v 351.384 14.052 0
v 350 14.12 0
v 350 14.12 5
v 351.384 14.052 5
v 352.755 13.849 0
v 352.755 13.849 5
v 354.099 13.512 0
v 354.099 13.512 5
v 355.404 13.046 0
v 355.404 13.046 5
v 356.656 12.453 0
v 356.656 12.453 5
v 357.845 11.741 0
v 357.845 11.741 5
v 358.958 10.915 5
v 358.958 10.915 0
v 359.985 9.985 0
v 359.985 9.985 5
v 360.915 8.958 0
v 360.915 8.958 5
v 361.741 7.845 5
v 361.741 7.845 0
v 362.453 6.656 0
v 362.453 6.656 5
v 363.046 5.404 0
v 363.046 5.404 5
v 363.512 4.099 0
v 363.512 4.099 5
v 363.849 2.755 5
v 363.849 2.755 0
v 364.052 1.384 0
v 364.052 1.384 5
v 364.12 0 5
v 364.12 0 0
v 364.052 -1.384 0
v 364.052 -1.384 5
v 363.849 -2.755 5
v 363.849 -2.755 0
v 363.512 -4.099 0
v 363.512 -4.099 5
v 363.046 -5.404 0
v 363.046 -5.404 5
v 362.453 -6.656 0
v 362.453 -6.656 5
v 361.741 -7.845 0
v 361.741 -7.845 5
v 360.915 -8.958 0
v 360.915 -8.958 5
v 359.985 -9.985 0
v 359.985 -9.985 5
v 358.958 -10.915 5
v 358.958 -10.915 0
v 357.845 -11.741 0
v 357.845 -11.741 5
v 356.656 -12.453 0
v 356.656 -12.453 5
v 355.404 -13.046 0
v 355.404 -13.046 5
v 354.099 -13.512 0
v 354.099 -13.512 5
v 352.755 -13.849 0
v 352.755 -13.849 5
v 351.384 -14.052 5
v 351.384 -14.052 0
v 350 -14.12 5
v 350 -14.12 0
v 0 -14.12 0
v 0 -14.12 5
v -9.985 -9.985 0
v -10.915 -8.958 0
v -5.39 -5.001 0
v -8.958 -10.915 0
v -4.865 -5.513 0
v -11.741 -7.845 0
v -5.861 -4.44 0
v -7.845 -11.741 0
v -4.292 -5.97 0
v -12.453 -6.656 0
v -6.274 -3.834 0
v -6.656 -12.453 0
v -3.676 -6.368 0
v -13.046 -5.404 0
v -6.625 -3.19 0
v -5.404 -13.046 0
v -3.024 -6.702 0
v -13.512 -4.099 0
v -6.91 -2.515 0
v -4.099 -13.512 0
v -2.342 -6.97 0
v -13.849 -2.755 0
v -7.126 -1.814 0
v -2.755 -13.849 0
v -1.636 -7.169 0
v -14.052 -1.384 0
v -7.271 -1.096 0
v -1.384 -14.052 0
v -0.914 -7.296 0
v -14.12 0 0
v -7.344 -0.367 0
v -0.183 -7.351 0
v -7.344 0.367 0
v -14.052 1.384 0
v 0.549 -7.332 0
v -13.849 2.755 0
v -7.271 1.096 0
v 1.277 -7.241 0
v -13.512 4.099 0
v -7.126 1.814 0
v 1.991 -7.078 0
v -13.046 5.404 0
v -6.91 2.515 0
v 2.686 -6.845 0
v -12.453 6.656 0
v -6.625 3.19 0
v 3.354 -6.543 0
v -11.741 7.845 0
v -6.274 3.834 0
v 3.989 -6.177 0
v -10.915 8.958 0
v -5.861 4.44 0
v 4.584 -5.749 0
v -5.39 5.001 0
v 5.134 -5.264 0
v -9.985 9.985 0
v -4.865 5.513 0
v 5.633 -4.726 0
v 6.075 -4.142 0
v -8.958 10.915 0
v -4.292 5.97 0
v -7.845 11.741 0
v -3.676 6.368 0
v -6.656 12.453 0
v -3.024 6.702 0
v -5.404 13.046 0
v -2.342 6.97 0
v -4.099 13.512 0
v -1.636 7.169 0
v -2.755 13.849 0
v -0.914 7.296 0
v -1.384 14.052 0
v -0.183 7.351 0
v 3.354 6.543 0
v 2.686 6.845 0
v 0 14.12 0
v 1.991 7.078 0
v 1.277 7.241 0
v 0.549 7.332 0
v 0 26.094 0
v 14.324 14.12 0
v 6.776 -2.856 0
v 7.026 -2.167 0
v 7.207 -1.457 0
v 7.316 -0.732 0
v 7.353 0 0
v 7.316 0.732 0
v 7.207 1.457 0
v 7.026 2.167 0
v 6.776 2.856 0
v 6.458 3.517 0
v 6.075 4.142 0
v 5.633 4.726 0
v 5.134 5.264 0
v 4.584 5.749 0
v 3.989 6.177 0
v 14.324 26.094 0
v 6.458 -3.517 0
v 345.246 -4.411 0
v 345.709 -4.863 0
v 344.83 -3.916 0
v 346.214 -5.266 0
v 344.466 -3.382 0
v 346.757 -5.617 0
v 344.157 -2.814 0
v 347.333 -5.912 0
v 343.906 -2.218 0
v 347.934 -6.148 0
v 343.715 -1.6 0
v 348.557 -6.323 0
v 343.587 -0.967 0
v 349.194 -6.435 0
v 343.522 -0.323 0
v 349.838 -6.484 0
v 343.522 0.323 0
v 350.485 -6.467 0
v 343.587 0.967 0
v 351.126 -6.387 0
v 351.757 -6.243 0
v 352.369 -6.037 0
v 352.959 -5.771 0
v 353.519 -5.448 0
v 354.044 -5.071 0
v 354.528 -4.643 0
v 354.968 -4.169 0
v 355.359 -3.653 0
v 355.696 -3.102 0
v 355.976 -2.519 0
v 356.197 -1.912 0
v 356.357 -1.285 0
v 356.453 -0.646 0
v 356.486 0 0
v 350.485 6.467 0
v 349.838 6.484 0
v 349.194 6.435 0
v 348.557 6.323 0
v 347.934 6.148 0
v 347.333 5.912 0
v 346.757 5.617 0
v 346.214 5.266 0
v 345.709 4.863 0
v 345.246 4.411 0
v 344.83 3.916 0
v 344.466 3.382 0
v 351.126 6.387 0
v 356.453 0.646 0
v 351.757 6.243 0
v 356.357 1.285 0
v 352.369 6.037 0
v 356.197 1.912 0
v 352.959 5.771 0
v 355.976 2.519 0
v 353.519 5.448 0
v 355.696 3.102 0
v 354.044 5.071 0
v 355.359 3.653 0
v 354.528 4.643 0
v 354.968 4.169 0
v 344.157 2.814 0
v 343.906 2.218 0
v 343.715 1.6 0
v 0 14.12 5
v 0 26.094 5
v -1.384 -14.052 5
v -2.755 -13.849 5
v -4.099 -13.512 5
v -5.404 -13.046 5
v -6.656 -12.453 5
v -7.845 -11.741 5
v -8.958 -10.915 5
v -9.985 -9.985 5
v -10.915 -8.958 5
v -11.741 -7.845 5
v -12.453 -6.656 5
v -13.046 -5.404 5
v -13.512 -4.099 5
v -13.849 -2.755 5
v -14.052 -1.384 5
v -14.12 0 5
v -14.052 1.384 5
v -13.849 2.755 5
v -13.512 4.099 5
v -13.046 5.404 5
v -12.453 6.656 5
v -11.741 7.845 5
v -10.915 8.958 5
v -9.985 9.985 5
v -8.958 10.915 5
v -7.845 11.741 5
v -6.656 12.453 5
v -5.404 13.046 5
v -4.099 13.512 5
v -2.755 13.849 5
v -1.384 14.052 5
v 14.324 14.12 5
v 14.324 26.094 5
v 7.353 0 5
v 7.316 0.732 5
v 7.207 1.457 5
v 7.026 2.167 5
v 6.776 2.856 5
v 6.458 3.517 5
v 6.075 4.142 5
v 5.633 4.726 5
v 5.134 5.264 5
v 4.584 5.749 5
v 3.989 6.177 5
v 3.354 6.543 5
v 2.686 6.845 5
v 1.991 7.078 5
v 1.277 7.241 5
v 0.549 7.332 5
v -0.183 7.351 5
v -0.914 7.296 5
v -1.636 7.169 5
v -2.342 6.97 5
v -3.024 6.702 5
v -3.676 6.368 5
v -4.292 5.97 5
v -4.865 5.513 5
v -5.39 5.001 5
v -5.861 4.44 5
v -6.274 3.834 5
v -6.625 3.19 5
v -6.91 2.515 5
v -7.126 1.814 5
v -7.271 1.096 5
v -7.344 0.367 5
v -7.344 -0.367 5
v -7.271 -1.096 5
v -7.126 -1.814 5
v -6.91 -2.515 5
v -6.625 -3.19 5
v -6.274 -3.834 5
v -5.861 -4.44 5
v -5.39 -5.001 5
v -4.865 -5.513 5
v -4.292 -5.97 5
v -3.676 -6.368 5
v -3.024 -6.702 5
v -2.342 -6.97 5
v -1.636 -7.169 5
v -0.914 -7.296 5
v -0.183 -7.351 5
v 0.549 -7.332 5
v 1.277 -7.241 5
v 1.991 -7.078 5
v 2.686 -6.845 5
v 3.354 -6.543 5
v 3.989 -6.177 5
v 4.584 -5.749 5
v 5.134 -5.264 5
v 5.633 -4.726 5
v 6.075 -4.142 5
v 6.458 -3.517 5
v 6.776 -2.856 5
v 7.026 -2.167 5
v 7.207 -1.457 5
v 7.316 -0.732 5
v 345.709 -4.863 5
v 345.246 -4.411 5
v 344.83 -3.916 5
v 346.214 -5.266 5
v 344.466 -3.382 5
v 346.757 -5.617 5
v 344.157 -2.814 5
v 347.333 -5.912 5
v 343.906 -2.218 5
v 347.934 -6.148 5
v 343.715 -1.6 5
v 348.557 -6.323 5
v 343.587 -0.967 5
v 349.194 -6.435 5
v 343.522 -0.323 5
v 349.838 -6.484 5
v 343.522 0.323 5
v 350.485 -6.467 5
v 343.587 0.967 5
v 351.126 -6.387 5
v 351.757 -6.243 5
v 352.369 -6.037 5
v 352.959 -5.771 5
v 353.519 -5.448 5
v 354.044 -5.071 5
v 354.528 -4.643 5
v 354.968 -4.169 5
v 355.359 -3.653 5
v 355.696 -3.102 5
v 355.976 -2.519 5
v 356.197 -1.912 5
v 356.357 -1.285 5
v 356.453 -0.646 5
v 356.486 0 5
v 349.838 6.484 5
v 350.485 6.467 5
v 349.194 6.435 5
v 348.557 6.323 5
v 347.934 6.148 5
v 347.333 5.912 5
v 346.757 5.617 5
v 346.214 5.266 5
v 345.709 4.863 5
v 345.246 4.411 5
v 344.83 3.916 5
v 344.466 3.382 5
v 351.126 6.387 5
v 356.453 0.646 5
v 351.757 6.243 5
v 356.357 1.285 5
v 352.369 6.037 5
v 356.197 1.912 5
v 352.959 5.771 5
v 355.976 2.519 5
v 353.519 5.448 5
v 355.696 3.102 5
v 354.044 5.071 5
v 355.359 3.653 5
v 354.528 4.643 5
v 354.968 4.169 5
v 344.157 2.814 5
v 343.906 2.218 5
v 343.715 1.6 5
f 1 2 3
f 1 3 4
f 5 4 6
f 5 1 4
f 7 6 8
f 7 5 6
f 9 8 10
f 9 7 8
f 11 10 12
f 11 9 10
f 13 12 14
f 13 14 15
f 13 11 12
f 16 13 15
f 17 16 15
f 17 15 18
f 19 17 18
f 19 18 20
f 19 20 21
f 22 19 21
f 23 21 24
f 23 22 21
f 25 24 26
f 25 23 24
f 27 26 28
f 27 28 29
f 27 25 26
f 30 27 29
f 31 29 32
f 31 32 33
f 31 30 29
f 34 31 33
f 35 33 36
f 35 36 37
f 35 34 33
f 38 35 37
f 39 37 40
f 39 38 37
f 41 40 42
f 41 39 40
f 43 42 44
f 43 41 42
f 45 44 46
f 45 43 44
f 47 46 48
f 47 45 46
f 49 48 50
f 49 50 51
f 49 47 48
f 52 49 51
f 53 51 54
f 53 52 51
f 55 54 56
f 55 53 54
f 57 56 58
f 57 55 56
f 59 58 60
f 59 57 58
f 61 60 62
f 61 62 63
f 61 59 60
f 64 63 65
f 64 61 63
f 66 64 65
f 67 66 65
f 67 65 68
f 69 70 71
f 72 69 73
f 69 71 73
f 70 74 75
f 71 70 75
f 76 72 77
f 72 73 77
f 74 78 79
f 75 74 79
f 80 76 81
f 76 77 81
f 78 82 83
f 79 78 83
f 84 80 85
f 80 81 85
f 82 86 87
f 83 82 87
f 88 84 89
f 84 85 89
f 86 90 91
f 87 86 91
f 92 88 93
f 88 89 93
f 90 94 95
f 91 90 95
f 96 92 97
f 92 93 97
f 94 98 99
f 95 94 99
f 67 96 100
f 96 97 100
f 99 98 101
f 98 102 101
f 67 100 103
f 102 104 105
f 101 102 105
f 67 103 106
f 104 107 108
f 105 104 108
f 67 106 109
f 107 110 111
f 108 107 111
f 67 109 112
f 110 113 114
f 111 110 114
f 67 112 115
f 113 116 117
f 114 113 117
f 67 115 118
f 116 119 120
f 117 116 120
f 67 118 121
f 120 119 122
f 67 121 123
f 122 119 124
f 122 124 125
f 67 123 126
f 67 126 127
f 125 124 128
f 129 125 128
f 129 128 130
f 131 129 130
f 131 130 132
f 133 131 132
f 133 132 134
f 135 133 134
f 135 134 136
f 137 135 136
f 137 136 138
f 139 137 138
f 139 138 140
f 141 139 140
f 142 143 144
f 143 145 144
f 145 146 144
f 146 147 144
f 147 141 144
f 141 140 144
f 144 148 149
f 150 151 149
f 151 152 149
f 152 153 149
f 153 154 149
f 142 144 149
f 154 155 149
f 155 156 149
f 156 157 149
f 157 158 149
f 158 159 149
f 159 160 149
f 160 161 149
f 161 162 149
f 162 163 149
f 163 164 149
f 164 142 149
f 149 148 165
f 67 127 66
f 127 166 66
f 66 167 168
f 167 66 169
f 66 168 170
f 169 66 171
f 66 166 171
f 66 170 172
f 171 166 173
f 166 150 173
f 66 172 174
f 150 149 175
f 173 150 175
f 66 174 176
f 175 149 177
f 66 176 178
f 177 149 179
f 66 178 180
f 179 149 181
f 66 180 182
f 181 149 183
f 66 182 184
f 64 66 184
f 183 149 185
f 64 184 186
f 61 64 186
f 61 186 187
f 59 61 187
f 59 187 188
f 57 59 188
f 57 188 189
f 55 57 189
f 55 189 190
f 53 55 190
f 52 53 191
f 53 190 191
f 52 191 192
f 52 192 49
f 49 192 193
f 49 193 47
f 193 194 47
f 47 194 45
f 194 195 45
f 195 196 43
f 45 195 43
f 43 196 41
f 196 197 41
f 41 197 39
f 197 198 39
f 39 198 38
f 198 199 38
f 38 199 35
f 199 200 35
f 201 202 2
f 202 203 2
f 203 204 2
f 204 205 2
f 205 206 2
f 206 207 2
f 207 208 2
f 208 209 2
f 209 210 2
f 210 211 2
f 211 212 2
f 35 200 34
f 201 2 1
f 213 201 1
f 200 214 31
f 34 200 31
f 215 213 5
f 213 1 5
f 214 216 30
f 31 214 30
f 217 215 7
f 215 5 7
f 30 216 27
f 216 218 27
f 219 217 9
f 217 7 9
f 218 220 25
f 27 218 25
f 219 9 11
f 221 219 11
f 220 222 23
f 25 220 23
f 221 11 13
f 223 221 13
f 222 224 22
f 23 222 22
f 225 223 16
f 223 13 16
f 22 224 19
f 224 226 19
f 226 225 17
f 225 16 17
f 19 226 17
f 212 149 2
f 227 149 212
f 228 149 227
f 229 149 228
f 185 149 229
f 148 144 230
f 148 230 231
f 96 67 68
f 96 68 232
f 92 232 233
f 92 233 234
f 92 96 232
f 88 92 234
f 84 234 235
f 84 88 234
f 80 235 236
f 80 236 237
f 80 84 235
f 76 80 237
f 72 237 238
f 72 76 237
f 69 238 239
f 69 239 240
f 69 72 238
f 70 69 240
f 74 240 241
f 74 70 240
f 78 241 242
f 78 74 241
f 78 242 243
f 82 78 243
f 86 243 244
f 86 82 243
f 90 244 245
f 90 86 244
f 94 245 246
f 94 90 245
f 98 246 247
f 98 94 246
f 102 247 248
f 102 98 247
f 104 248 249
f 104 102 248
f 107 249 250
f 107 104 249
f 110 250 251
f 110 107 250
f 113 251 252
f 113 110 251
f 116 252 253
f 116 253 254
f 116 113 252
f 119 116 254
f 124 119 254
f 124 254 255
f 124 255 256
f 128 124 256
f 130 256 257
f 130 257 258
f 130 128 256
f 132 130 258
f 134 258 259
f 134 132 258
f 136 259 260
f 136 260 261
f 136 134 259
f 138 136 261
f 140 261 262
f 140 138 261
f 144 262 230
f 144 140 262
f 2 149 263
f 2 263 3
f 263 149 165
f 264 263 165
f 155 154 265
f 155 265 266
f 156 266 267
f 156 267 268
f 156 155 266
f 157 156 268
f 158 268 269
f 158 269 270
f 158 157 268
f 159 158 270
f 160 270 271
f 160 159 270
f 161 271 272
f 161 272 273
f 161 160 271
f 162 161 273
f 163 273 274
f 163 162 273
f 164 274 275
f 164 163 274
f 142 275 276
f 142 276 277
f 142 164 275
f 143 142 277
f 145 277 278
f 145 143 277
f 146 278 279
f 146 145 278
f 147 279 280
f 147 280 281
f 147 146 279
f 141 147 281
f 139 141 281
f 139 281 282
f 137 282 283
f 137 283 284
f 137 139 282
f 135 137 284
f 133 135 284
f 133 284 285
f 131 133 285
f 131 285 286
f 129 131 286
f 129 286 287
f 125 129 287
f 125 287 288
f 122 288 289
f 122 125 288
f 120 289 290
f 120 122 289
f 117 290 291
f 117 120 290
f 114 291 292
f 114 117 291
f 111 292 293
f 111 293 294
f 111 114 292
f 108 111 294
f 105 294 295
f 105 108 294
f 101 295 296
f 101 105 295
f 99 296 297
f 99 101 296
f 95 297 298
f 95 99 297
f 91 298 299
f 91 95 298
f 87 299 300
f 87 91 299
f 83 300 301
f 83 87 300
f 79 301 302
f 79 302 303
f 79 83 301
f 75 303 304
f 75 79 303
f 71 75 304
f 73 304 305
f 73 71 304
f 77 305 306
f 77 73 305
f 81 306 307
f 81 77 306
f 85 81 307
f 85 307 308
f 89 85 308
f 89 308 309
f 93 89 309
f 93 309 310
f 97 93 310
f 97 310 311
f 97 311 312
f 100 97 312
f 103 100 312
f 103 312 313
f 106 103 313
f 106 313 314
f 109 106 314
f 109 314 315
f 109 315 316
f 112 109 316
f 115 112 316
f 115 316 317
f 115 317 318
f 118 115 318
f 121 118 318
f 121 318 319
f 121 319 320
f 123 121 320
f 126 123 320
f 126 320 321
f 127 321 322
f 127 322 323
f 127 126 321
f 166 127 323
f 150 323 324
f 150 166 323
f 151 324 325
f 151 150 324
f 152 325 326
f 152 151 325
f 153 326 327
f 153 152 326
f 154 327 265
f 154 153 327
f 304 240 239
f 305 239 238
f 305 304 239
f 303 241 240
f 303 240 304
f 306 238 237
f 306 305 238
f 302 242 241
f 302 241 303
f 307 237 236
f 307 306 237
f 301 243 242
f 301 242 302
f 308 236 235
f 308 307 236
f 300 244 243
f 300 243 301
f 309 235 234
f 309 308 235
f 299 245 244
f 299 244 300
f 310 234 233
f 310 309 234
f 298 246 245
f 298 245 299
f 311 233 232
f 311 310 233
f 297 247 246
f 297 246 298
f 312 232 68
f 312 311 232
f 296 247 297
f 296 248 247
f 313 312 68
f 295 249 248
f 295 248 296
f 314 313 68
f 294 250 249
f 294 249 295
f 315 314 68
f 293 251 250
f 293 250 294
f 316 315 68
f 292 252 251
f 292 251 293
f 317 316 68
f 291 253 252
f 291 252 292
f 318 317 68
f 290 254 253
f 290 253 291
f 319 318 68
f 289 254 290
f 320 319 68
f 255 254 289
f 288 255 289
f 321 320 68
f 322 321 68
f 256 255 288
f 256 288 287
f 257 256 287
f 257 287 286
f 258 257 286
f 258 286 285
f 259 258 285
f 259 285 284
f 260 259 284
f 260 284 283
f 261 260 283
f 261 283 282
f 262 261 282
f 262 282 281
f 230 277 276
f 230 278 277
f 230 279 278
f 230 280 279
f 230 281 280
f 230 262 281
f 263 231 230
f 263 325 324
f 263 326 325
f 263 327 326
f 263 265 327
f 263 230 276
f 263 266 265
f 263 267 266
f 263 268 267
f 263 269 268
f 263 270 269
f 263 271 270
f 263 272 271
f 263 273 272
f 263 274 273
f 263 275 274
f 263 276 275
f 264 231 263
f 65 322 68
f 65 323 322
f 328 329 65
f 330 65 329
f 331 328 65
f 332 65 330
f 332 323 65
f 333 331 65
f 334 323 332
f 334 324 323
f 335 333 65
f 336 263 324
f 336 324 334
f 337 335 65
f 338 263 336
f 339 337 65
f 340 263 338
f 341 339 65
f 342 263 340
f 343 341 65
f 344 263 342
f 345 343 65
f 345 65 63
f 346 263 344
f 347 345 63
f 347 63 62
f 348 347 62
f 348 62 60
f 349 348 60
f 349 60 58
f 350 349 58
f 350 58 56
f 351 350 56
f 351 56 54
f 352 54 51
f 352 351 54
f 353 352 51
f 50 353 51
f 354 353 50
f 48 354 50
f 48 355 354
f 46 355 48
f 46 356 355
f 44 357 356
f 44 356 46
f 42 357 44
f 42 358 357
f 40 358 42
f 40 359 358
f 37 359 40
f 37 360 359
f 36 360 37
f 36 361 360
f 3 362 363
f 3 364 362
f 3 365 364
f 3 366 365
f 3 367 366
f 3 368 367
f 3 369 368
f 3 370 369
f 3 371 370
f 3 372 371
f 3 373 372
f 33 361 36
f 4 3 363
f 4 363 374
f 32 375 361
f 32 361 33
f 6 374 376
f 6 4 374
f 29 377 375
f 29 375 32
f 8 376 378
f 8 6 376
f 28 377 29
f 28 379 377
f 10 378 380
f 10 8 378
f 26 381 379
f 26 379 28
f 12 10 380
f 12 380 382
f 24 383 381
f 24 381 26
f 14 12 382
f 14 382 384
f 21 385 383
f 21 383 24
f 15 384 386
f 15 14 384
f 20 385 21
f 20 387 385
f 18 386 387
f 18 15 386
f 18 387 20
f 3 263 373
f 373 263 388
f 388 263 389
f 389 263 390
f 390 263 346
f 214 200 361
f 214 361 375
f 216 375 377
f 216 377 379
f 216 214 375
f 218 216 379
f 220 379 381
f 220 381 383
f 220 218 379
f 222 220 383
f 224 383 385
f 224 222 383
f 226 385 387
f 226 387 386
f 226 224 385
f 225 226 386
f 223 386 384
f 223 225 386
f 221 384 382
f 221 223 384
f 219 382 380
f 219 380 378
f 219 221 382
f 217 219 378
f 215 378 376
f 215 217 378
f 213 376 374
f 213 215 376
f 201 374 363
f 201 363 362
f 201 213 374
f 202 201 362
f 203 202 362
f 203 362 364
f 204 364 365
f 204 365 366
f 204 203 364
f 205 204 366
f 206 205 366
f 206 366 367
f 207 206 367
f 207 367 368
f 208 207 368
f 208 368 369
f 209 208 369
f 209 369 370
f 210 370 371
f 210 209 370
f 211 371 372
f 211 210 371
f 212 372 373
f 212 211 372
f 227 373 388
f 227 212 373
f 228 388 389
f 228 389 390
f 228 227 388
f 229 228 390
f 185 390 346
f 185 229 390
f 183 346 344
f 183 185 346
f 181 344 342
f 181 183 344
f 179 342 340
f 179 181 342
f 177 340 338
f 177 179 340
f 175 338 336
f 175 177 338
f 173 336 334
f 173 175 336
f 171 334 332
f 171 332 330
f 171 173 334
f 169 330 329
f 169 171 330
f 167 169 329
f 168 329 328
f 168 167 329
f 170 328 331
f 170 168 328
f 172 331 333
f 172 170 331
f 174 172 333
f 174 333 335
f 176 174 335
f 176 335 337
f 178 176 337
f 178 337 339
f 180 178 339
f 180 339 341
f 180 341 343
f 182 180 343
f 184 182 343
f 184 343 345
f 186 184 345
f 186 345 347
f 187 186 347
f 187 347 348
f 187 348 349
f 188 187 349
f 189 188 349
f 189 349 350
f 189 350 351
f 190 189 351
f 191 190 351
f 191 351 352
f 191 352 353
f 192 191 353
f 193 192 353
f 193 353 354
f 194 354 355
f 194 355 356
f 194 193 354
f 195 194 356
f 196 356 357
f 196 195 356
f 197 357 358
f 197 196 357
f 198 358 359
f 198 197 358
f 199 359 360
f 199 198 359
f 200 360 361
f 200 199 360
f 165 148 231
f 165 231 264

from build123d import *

# Parameters (mm, degrees)
SKETCH_1_R      = 7.352953784
SKETCH_1_R_2    = 6.485613762
EXTRUDE_1_DEPTH = 5
SKETCH_2_W      = 14.323977173
SKETCH_2_H      = 11.973415737
EXTRUDE_2_DEPTH = 5


with BuildPart() as part:
    # 草图1 → 凸台-拉伸1 (new body)
    with BuildSketch(Plane.XY):
        with BuildLine():
            Line((0, 14.12037037), (350, 14.12037037))
            ThreePointArc((350, 14.12037037), (364.12037037, 0), (350, -14.12037037))
            Line((350, -14.12037037), (0, -14.12037037))
            ThreePointArc((0, -14.12037037), (-14.12037037, 0), (0, 14.12037037))
        make_face()
        Circle(SKETCH_1_R, mode=Mode.SUBTRACT)
        with Locations((350, 0)):
            Circle(SKETCH_1_R_2, mode=Mode.SUBTRACT)
    extrude(amount=EXTRUDE_1_DEPTH)

    # 草图2 → 凸台-拉伸2 (add)
    with BuildSketch(Plane.XY):
        with Locations((7.161988587, 20.107078239)):
            Rectangle(SKETCH_2_W, SKETCH_2_H)
    extrude(amount=EXTRUDE_2_DEPTH)


solid = part.part
